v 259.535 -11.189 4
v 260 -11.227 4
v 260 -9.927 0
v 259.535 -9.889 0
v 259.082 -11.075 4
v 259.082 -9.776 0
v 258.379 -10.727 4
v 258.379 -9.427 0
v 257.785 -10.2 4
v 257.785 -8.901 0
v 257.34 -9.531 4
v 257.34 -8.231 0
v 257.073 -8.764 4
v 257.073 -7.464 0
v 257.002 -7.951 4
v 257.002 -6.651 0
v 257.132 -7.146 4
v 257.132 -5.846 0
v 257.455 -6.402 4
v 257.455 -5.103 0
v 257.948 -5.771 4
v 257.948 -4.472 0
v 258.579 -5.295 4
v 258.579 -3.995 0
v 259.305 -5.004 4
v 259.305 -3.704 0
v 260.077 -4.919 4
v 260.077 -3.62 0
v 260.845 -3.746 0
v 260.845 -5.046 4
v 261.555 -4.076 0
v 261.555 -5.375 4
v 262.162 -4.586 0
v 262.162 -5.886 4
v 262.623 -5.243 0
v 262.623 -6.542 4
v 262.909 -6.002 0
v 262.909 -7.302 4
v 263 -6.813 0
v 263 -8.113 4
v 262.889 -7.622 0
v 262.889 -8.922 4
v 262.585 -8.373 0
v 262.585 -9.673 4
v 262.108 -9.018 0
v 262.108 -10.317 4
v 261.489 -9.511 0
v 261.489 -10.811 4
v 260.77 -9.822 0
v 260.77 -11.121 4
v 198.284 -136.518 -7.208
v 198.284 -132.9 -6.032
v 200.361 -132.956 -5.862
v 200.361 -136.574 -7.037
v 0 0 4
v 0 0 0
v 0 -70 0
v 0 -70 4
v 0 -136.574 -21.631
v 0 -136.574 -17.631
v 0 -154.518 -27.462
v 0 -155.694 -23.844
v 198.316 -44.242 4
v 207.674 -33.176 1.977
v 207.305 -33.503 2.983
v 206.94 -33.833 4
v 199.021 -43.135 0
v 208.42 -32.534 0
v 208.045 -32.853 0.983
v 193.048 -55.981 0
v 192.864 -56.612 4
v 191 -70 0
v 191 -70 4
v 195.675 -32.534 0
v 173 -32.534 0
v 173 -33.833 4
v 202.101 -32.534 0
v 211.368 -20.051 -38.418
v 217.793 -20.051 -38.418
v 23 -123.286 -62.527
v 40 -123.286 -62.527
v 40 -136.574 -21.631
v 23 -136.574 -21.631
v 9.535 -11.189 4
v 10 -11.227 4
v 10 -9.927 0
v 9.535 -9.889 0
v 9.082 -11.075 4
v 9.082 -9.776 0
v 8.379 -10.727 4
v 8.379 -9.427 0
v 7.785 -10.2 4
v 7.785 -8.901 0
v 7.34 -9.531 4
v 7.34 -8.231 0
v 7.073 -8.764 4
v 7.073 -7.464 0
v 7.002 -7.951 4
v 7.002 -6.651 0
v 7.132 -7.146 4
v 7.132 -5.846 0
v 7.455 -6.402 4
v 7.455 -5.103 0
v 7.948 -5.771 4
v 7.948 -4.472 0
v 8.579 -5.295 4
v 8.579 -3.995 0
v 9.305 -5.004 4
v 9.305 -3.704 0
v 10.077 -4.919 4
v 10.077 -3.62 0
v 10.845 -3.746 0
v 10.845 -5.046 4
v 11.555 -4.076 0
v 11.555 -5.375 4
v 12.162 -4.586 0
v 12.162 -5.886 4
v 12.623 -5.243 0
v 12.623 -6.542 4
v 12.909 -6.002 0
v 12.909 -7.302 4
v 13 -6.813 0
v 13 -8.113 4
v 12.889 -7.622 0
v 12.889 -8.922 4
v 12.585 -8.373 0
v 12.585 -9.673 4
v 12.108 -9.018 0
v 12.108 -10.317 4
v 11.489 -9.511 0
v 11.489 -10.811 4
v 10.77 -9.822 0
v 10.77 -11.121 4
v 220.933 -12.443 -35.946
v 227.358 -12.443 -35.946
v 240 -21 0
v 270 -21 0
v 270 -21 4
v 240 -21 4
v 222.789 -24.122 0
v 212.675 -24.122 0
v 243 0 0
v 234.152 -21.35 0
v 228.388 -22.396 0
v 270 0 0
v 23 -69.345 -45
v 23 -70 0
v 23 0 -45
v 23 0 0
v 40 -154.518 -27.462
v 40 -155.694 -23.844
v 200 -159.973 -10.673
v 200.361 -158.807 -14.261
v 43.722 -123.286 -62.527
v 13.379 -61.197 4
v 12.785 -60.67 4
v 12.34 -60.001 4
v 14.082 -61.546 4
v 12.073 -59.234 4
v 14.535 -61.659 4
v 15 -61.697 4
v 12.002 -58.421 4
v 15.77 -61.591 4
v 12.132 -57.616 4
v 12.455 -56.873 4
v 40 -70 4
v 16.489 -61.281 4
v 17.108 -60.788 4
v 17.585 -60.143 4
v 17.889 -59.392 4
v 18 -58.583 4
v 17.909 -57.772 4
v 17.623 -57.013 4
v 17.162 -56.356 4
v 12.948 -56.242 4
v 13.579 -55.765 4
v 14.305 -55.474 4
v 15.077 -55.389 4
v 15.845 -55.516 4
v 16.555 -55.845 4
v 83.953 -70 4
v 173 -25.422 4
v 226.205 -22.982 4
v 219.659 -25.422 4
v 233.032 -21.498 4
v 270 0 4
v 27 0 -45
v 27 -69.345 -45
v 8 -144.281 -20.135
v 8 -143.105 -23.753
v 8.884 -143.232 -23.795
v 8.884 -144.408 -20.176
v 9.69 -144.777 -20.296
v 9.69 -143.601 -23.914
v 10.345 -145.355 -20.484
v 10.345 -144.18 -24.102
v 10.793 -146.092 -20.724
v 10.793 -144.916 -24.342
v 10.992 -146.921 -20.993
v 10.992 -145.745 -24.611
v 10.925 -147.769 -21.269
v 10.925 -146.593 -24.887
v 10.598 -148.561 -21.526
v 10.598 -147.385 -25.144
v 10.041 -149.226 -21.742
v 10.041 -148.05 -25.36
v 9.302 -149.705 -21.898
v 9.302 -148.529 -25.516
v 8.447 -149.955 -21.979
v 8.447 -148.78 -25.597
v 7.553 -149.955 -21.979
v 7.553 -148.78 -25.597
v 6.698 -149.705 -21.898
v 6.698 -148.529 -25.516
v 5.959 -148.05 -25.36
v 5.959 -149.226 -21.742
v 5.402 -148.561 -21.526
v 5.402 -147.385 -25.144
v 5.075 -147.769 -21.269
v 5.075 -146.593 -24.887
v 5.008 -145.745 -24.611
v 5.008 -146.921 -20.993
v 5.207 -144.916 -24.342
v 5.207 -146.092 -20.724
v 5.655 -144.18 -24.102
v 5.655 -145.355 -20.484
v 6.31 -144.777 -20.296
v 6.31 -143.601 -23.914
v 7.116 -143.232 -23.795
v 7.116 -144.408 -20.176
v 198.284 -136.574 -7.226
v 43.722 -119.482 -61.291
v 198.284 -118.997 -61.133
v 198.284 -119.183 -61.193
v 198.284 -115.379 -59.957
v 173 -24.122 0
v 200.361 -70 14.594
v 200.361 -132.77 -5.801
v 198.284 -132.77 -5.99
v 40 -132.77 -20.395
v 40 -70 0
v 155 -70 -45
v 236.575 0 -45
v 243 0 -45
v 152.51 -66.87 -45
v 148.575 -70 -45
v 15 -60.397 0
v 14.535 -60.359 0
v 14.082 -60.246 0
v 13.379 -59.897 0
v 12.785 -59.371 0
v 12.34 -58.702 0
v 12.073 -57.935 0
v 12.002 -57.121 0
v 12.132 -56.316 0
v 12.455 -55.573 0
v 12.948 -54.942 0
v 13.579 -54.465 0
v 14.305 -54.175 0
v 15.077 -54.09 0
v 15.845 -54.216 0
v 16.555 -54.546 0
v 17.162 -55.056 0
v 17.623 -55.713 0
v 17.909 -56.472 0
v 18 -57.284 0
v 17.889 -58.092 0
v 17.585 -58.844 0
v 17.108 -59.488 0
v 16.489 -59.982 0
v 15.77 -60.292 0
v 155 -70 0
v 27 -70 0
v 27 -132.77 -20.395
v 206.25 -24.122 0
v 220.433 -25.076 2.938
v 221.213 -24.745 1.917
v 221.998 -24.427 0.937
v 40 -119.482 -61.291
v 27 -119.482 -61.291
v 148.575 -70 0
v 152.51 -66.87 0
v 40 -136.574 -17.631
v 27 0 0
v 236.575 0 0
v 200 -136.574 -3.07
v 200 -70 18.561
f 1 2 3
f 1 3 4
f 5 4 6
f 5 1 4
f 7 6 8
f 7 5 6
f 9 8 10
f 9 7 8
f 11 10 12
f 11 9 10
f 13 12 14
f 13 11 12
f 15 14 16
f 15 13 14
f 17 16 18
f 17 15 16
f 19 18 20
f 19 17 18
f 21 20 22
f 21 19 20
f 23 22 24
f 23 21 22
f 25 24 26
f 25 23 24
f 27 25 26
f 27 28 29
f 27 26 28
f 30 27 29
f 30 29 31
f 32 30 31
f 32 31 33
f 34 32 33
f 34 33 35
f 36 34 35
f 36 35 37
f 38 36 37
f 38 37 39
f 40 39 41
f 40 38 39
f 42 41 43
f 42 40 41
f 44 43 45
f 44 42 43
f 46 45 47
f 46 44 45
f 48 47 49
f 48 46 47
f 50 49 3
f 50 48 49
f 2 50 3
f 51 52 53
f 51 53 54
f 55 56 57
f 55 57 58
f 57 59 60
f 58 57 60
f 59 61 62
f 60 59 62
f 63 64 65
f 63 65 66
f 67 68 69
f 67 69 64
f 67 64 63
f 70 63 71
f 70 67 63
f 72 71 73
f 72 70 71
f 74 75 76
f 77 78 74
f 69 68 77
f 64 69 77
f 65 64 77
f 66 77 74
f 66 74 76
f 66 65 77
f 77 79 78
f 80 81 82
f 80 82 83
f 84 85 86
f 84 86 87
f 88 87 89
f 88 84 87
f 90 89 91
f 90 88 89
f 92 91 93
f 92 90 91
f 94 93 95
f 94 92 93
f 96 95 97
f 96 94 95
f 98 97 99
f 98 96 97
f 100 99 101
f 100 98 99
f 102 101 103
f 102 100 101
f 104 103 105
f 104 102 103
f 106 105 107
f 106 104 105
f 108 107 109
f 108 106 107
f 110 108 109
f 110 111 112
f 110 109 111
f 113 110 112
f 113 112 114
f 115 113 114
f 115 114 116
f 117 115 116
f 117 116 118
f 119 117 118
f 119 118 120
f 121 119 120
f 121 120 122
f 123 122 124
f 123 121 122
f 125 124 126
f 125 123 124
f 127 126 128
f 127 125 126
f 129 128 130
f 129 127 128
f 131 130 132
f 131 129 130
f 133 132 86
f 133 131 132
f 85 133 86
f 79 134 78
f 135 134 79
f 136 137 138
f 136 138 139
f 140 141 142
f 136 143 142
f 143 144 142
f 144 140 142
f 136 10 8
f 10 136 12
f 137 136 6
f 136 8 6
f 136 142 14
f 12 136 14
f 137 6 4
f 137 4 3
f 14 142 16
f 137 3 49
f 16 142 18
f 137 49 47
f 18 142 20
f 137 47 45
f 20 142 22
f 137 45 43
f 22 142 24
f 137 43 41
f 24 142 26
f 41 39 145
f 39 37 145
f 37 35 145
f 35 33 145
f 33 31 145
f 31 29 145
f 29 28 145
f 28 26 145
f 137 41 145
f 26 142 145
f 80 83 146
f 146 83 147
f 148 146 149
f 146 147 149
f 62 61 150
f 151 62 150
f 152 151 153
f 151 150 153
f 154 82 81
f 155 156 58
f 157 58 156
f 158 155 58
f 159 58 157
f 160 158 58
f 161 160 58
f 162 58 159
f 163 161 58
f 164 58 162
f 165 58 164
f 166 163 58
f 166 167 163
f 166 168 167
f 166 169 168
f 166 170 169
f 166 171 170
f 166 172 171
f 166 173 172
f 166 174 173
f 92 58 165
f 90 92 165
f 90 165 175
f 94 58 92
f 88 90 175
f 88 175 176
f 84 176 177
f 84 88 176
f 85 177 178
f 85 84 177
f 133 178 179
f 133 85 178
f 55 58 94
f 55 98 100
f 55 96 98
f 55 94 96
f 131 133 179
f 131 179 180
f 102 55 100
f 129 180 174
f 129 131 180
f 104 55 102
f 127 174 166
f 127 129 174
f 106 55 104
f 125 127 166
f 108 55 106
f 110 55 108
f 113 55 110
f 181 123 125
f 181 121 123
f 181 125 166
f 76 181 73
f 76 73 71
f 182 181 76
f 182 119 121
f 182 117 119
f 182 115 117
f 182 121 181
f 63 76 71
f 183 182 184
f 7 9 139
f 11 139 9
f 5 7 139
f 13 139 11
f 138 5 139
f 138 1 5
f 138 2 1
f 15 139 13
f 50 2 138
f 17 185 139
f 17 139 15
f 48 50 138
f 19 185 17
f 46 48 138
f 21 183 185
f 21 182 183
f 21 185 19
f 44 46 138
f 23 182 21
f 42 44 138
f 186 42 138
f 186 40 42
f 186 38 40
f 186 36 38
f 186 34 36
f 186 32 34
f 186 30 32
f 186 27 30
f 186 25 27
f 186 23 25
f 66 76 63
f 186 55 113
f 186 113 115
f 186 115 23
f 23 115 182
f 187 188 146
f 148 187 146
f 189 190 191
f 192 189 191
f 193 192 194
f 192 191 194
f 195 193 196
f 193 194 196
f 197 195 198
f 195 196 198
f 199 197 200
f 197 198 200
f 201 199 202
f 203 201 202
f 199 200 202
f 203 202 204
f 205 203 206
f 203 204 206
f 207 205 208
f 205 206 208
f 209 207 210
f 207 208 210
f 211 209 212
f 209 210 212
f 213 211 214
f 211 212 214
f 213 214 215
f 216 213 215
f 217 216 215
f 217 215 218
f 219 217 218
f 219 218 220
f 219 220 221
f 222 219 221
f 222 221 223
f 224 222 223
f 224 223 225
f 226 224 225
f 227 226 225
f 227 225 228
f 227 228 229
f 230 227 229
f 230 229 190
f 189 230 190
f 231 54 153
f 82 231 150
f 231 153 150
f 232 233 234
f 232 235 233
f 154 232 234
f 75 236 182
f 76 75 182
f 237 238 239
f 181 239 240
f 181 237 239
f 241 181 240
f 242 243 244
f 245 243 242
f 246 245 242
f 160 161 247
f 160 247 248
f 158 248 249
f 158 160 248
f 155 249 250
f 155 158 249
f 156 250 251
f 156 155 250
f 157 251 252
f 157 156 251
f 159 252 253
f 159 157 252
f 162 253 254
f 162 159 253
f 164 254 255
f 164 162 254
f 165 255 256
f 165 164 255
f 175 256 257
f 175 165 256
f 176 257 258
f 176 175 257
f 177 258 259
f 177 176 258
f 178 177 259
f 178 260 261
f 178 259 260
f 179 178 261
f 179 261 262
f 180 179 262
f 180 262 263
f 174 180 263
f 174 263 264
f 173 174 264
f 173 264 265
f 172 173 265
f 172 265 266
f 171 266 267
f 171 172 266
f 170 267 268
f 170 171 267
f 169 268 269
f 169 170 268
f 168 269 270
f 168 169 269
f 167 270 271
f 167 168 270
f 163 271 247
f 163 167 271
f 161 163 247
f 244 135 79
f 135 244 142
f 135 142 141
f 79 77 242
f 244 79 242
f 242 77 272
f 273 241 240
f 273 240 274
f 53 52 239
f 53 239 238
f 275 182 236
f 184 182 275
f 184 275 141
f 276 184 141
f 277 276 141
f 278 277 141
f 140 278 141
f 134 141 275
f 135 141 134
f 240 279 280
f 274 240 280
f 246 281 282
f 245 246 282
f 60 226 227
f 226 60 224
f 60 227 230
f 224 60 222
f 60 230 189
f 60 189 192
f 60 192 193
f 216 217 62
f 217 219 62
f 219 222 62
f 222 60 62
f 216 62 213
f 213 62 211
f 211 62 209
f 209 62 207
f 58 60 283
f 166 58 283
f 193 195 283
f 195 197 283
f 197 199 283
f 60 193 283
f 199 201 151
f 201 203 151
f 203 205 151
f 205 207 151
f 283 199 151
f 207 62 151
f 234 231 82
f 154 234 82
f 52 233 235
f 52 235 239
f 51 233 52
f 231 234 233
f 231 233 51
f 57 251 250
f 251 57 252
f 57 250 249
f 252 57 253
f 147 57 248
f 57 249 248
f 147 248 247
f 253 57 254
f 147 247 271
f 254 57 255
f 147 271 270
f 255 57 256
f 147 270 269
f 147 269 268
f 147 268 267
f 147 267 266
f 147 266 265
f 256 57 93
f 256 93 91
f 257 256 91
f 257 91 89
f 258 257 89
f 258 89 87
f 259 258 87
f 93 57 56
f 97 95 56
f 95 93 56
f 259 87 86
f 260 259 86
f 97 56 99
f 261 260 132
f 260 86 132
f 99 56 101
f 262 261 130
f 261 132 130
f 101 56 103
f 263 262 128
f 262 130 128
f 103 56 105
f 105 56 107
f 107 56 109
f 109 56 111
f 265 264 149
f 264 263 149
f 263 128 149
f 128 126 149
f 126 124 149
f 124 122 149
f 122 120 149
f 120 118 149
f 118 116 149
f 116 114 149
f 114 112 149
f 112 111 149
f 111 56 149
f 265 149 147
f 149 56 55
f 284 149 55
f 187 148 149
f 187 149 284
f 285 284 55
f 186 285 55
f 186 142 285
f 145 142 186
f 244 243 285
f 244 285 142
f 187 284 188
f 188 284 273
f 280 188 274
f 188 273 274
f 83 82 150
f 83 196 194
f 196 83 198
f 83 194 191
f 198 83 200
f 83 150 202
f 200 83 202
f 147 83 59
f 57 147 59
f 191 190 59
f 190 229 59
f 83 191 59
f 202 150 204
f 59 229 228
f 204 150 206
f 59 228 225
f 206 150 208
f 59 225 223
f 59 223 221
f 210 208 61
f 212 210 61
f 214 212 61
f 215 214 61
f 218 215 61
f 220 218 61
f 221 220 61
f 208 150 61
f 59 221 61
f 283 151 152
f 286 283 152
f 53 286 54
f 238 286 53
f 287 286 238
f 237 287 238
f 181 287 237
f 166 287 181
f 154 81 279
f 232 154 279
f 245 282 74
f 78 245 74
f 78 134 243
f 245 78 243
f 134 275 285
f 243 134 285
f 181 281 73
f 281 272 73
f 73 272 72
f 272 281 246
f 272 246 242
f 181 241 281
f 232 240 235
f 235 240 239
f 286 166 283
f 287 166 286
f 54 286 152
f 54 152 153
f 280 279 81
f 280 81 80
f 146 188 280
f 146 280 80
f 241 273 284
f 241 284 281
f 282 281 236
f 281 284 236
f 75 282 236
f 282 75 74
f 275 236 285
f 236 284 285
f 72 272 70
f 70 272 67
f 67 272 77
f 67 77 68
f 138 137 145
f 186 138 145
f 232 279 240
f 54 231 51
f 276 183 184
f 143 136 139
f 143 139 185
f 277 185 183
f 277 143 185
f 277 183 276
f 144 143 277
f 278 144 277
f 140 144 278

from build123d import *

# Parameters (mm, degrees)
SKETCH1_W               = 270
SKETCH1_H               = 70
BOSS_EXTRUDE1_DEPTH     = 4
BOSS_EXTRUDE4_DEPTH     = 70
SKETCH7_R               = 3
CUT_EXTRUDE1_DEPTH      = 304.970702227
CUT_EXTRUDE2_DEPTH      = 10
SKETCH9_W               = 4
SKETCH9_H               = 70
BOSS_EXTRUDE5_DEPTH     = 45
SKETCH10_W              = 13
SKETCH10_H              = 4
BOSS_EXTRUDE6_DEPTH     = 43
BOSS_EXTRUDE7_REACH     = 313.858
BOSS_EXTRUDE8_REACH     = 276.704
BOSS_EXTRUDE9_START     = -155.441370069
BOSS_EXTRUDE9_DEPTH     = 24.603121834
SKETCH14_R              = 3
CUT_EXTRUDE3_DEPTH      = 4
CUT_EXTRUDE4_REACH      = 322.045
SKETCH15_W              = 7
SKETCH15_H              = 3.80460454
CUT_EXTRUDE5_DEPTH      = 10
CUT_EXTRUDE5_DEPTH_BACK = 304.645223857
CUT_EXTRUDE6_DEPTH      = 70


# Read off the part's stored shape, not the designer's step: Boss-Extrude9
with BuildPart() as part:
    # Sketch1 → Boss-Extrude1 (new body)
    with BuildSketch(Plane.XY):
        with Locations((135, -35)):
            Rectangle(SKETCH1_W, SKETCH1_H)
    extrude(amount=BOSS_EXTRUDE1_DEPTH)


with BuildPart() as body_2:
    # Mirror1: mirrored copy
    add(part.part.mirror(Plane(origin=(135, 0, 0), x_dir=(0, 0, 1), z_dir=(1, 0, 0))))


with BuildPart() as part_1:
    add(part.part)

    add(body_2.part)  # Boss-Extrude4 merges body 2
    # Sketch2 → Boss-Extrude4 (add, along a direction that is not the sketch's normal)
    with BuildSketch(Plane.XZ.offset(70)):
        Polygon((200.361038291, 14.593997741), (40, 0), (0, 0), (0, 4), (40, 4), (200, 18.561140682), align=None)
    extrude(amount=BOSS_EXTRUDE4_DEPTH, dir=(0, -0.9510565162951534, -0.30901699437494823))

    # Sketch7 → Cut-Extrude1 (cut, through all)
    with BuildSketch(Plane(origin=(0, -15.671129003, 48.230775743), x_dir=(-1, 0, 0), z_dir=(0, 0.3090169943749448, -0.9510565162951545))):
        with Locations((-8, -146.441370146)):
            Circle(SKETCH7_R)
        with Locations(Location((-15, -54.441370146, 0), (0, 0, 270))):
            Circle(SKETCH7_R)
        with Locations(Location((-255, -54.441370146, 0), (0, 0, 270))):
            Circle(SKETCH7_R)
        with Locations((-262, -146.441370146)):
            Circle(SKETCH7_R)
        with Locations(Location((-10, -6.441370146, 0), (0, 0, 270))):
            Circle(SKETCH7_R)
        with Locations(Location((-260, -6.441370146, 0), (0, 0, 270))):
            Circle(SKETCH7_R)
    extrude(amount=CUT_EXTRUDE1_DEPTH, mode=Mode.SUBTRACT)

    # Sketch8 → Cut-Extrude2 (cut)
    with BuildSketch(Plane(origin=(0, 0, 0), x_dir=(-1, 0, 0), z_dir=(0, 0, -1))):
        with BuildLine():
            Line((-270, -70), (-270, -21))
            Line((-270, -21), (-240, -21))
            ThreePointArc((-240, -21), (-205.351767722, -35.351767722), (-191, -70))
            Line((-191, -70), (-270, -70))
        make_face()
    extrude(amount=-CUT_EXTRUDE2_DEPTH, mode=Mode.SUBTRACT)

    # Sketch9 → Boss-Extrude5 (add)
    with BuildSketch(Plane(origin=(0, 0, 0), x_dir=(-1, 0, 0), z_dir=(0, 0, -1))):
        Polygon((-243, 0), (-155, -70), (-148.574540436, -70), (-152.509905737, -66.869595783), (-236.574540436, 0), align=None)
        with Locations((-25, -35)):
            Rectangle(SKETCH9_W, SKETCH9_H)
    extrude(amount=BOSS_EXTRUDE5_DEPTH)

    # Sketch10 → Boss-Extrude6 (add)
    with BuildSketch(Plane(origin=(0, -6.684405197, 20.57248383), x_dir=(-1, 0, 0), z_dir=(0, 0.3090169943749482, -0.9510565162951534))):
        with Locations((-33.5, -134.573956141)):
            Rectangle(SKETCH10_W, SKETCH10_H)
        Polygon((-23, -66.573956141), (-27, -66.573956141), (-27, -132.573956141), (-27, -136.573956141), (-23, -136.573956141), align=None)
    extrude(amount=BOSS_EXTRUDE6_DEPTH)

    # Boss-Extrude7: up to this plane
    boss_extrude7_end = Plane(origin=(0, 6.603325561, -20.32294637), z_dir=(0, 0.30901699437494823, -0.9510565162951534))
    # Sketch11 → Boss-Extrude7 (add, up to the surface)
    with BuildSketch(Plane(origin=(-1.560893066, -5.572804076, 17.151327361), x_dir=(-0.9962752106554099, 0.026646699794247903, -0.08201010927680777), z_dir=(0.08623053191021567, 0.30786597116700337, -0.947514031117154)), mode=Mode.PRIVATE) as boss_extrude7_sk1:
        Polygon((-41.716277412, -132.573956141), (-202.676859965, -128.064162823), (-202.676859965, -132.064162823), (-41.716277412, -136.573956141), align=None)
    boss_extrude7_tool1 = split(extrude(boss_extrude7_sk1.sketch, amount=BOSS_EXTRUDE7_REACH, mode=Mode.PRIVATE), bisect_by=boss_extrude7_end, keep=Keep.BOTH, mode=Mode.PRIVATE)
    add(boss_extrude7_tool1.solids().sort_by_distance((120.180519, -134.671843, -13.716157))[0])

    # Boss-Extrude8: up to this face of the body (flat: up to its plane)
    boss_extrude8_end = Plane(part_1.part.faces().sort_by_distance((41.860887851, -128.027977729, -41.460870718))[0])
    # Sketch12 → Boss-Extrude8 (add, up to the picked face)
    with BuildSketch(Plane(origin=(40, 0, 0), x_dir=(0, 0, -1), z_dir=(1, 0, 0)), mode=Mode.PRIVATE) as boss_extrude8_sk1:
        Polygon((20.395121629, -132.769730075), (21.631189606, -136.573956141), (62.526619807, -123.286225383), (61.290551829, -119.481999317), align=None)
    boss_extrude8_tool1 = split(extrude(boss_extrude8_sk1.sketch, amount=BOSS_EXTRUDE8_REACH, mode=Mode.PRIVATE), bisect_by=boss_extrude8_end, keep=Keep.BOTH, mode=Mode.PRIVATE)
    add(boss_extrude8_tool1.solids().sort_by(Axis((40, -128.027978, -41.460871), (1, 0, 0)))[0])

    # Boss-Extrude9 outline → Boss-Extrude9 (add)
    with BuildSketch(Plane(origin=(0, 0, 0), x_dir=(1, 0, 0), z_dir=(0, 0.9510565162951545, 0.3090169943749449)).offset(BOSS_EXTRUDE9_START)):
        Polygon((200.361038291, -35.510906256), (40, -21.631189606), (0, -21.631189606), (0, -25.435415671), (40, -25.435415671), (200, -39.283883402), align=None)
    extrude(amount=BOSS_EXTRUDE9_DEPTH)

    # Sketch14 → Cut-Extrude3 (cut)
    with BuildSketch(Plane(origin=(0, -6.684405197, 20.57248383), x_dir=(-1, 0, 0), z_dir=(0, 0.3090169943749481, -0.9510565162951534))):
        with Locations(Location((-8, -146.441370069, 0), (0, 0, 90))):
            Circle(SKETCH14_R)
    extrude(amount=-CUT_EXTRUDE3_DEPTH, mode=Mode.SUBTRACT)

    # Cut-Extrude4: up to this plane
    cut_extrude4_end = Plane(origin=(200.361038291, -136.573956141, -7.037191865), z_dir=(0.08623053191021565, 0.3078659711670031, -0.9475140311171542))
    # Sketch15 → Cut-Extrude4 (cut, up to the surface)
    with BuildSketch(Plane(origin=(0, 6.603325561, -20.32294637), x_dir=(-1, 0, 0), z_dir=(0, 0.3090169943749483, -0.9510565162951534)), mode=Mode.PRIVATE) as cut_extrude4_sk1:
        with Locations((-201.784144044, -130.161860553)):
            Rectangle(SKETCH15_W, SKETCH15_H)
    cut_extrude4_tool1 = split(extrude(cut_extrude4_sk1.sketch, amount=-CUT_EXTRUDE4_REACH, mode=Mode.PRIVATE), bisect_by=cut_extrude4_end, keep=Keep.BOTH, mode=Mode.PRIVATE)
    add(cut_extrude4_tool1.solids().sort_by_distance((201.784144, -117.18796, -60.545173))[0], mode=Mode.SUBTRACT)

    # Sketch16 → Cut-Extrude5 (cut, two sides: drawn at the far end of the back side and taken through both)
    with BuildSketch(Plane(origin=(0, -125.600482622, -40.81007066), x_dir=(1, 0, 0), z_dir=(0, 0.9510565162951534, 0.3090169943749483)).offset(-CUT_EXTRUDE5_DEPTH_BACK)):
        Polygon((205.284144044, 21.368810394), (198.284144044, 21.368810394), (198.284144044, -35.331144988), (200.361038291, -35.510906256), align=None)
    extrude(amount=CUT_EXTRUDE5_DEPTH + CUT_EXTRUDE5_DEPTH_BACK, mode=Mode.SUBTRACT)

    # Sketch17 → Cut-Extrude6 (cut)
    with BuildSketch(Plane(origin=(243, 0, 0), x_dir=(0, 0, -1), z_dir=(1, 0, 0))):
        Polygon((-13.772265004, -28.596864407), (35.94568304, -12.442523831), (38.417818995, -20.050975962), (-11.300129049, -36.205316538), align=None)
    extrude(amount=-CUT_EXTRUDE6_DEPTH, mode=Mode.SUBTRACT)


solid = part_1.part
